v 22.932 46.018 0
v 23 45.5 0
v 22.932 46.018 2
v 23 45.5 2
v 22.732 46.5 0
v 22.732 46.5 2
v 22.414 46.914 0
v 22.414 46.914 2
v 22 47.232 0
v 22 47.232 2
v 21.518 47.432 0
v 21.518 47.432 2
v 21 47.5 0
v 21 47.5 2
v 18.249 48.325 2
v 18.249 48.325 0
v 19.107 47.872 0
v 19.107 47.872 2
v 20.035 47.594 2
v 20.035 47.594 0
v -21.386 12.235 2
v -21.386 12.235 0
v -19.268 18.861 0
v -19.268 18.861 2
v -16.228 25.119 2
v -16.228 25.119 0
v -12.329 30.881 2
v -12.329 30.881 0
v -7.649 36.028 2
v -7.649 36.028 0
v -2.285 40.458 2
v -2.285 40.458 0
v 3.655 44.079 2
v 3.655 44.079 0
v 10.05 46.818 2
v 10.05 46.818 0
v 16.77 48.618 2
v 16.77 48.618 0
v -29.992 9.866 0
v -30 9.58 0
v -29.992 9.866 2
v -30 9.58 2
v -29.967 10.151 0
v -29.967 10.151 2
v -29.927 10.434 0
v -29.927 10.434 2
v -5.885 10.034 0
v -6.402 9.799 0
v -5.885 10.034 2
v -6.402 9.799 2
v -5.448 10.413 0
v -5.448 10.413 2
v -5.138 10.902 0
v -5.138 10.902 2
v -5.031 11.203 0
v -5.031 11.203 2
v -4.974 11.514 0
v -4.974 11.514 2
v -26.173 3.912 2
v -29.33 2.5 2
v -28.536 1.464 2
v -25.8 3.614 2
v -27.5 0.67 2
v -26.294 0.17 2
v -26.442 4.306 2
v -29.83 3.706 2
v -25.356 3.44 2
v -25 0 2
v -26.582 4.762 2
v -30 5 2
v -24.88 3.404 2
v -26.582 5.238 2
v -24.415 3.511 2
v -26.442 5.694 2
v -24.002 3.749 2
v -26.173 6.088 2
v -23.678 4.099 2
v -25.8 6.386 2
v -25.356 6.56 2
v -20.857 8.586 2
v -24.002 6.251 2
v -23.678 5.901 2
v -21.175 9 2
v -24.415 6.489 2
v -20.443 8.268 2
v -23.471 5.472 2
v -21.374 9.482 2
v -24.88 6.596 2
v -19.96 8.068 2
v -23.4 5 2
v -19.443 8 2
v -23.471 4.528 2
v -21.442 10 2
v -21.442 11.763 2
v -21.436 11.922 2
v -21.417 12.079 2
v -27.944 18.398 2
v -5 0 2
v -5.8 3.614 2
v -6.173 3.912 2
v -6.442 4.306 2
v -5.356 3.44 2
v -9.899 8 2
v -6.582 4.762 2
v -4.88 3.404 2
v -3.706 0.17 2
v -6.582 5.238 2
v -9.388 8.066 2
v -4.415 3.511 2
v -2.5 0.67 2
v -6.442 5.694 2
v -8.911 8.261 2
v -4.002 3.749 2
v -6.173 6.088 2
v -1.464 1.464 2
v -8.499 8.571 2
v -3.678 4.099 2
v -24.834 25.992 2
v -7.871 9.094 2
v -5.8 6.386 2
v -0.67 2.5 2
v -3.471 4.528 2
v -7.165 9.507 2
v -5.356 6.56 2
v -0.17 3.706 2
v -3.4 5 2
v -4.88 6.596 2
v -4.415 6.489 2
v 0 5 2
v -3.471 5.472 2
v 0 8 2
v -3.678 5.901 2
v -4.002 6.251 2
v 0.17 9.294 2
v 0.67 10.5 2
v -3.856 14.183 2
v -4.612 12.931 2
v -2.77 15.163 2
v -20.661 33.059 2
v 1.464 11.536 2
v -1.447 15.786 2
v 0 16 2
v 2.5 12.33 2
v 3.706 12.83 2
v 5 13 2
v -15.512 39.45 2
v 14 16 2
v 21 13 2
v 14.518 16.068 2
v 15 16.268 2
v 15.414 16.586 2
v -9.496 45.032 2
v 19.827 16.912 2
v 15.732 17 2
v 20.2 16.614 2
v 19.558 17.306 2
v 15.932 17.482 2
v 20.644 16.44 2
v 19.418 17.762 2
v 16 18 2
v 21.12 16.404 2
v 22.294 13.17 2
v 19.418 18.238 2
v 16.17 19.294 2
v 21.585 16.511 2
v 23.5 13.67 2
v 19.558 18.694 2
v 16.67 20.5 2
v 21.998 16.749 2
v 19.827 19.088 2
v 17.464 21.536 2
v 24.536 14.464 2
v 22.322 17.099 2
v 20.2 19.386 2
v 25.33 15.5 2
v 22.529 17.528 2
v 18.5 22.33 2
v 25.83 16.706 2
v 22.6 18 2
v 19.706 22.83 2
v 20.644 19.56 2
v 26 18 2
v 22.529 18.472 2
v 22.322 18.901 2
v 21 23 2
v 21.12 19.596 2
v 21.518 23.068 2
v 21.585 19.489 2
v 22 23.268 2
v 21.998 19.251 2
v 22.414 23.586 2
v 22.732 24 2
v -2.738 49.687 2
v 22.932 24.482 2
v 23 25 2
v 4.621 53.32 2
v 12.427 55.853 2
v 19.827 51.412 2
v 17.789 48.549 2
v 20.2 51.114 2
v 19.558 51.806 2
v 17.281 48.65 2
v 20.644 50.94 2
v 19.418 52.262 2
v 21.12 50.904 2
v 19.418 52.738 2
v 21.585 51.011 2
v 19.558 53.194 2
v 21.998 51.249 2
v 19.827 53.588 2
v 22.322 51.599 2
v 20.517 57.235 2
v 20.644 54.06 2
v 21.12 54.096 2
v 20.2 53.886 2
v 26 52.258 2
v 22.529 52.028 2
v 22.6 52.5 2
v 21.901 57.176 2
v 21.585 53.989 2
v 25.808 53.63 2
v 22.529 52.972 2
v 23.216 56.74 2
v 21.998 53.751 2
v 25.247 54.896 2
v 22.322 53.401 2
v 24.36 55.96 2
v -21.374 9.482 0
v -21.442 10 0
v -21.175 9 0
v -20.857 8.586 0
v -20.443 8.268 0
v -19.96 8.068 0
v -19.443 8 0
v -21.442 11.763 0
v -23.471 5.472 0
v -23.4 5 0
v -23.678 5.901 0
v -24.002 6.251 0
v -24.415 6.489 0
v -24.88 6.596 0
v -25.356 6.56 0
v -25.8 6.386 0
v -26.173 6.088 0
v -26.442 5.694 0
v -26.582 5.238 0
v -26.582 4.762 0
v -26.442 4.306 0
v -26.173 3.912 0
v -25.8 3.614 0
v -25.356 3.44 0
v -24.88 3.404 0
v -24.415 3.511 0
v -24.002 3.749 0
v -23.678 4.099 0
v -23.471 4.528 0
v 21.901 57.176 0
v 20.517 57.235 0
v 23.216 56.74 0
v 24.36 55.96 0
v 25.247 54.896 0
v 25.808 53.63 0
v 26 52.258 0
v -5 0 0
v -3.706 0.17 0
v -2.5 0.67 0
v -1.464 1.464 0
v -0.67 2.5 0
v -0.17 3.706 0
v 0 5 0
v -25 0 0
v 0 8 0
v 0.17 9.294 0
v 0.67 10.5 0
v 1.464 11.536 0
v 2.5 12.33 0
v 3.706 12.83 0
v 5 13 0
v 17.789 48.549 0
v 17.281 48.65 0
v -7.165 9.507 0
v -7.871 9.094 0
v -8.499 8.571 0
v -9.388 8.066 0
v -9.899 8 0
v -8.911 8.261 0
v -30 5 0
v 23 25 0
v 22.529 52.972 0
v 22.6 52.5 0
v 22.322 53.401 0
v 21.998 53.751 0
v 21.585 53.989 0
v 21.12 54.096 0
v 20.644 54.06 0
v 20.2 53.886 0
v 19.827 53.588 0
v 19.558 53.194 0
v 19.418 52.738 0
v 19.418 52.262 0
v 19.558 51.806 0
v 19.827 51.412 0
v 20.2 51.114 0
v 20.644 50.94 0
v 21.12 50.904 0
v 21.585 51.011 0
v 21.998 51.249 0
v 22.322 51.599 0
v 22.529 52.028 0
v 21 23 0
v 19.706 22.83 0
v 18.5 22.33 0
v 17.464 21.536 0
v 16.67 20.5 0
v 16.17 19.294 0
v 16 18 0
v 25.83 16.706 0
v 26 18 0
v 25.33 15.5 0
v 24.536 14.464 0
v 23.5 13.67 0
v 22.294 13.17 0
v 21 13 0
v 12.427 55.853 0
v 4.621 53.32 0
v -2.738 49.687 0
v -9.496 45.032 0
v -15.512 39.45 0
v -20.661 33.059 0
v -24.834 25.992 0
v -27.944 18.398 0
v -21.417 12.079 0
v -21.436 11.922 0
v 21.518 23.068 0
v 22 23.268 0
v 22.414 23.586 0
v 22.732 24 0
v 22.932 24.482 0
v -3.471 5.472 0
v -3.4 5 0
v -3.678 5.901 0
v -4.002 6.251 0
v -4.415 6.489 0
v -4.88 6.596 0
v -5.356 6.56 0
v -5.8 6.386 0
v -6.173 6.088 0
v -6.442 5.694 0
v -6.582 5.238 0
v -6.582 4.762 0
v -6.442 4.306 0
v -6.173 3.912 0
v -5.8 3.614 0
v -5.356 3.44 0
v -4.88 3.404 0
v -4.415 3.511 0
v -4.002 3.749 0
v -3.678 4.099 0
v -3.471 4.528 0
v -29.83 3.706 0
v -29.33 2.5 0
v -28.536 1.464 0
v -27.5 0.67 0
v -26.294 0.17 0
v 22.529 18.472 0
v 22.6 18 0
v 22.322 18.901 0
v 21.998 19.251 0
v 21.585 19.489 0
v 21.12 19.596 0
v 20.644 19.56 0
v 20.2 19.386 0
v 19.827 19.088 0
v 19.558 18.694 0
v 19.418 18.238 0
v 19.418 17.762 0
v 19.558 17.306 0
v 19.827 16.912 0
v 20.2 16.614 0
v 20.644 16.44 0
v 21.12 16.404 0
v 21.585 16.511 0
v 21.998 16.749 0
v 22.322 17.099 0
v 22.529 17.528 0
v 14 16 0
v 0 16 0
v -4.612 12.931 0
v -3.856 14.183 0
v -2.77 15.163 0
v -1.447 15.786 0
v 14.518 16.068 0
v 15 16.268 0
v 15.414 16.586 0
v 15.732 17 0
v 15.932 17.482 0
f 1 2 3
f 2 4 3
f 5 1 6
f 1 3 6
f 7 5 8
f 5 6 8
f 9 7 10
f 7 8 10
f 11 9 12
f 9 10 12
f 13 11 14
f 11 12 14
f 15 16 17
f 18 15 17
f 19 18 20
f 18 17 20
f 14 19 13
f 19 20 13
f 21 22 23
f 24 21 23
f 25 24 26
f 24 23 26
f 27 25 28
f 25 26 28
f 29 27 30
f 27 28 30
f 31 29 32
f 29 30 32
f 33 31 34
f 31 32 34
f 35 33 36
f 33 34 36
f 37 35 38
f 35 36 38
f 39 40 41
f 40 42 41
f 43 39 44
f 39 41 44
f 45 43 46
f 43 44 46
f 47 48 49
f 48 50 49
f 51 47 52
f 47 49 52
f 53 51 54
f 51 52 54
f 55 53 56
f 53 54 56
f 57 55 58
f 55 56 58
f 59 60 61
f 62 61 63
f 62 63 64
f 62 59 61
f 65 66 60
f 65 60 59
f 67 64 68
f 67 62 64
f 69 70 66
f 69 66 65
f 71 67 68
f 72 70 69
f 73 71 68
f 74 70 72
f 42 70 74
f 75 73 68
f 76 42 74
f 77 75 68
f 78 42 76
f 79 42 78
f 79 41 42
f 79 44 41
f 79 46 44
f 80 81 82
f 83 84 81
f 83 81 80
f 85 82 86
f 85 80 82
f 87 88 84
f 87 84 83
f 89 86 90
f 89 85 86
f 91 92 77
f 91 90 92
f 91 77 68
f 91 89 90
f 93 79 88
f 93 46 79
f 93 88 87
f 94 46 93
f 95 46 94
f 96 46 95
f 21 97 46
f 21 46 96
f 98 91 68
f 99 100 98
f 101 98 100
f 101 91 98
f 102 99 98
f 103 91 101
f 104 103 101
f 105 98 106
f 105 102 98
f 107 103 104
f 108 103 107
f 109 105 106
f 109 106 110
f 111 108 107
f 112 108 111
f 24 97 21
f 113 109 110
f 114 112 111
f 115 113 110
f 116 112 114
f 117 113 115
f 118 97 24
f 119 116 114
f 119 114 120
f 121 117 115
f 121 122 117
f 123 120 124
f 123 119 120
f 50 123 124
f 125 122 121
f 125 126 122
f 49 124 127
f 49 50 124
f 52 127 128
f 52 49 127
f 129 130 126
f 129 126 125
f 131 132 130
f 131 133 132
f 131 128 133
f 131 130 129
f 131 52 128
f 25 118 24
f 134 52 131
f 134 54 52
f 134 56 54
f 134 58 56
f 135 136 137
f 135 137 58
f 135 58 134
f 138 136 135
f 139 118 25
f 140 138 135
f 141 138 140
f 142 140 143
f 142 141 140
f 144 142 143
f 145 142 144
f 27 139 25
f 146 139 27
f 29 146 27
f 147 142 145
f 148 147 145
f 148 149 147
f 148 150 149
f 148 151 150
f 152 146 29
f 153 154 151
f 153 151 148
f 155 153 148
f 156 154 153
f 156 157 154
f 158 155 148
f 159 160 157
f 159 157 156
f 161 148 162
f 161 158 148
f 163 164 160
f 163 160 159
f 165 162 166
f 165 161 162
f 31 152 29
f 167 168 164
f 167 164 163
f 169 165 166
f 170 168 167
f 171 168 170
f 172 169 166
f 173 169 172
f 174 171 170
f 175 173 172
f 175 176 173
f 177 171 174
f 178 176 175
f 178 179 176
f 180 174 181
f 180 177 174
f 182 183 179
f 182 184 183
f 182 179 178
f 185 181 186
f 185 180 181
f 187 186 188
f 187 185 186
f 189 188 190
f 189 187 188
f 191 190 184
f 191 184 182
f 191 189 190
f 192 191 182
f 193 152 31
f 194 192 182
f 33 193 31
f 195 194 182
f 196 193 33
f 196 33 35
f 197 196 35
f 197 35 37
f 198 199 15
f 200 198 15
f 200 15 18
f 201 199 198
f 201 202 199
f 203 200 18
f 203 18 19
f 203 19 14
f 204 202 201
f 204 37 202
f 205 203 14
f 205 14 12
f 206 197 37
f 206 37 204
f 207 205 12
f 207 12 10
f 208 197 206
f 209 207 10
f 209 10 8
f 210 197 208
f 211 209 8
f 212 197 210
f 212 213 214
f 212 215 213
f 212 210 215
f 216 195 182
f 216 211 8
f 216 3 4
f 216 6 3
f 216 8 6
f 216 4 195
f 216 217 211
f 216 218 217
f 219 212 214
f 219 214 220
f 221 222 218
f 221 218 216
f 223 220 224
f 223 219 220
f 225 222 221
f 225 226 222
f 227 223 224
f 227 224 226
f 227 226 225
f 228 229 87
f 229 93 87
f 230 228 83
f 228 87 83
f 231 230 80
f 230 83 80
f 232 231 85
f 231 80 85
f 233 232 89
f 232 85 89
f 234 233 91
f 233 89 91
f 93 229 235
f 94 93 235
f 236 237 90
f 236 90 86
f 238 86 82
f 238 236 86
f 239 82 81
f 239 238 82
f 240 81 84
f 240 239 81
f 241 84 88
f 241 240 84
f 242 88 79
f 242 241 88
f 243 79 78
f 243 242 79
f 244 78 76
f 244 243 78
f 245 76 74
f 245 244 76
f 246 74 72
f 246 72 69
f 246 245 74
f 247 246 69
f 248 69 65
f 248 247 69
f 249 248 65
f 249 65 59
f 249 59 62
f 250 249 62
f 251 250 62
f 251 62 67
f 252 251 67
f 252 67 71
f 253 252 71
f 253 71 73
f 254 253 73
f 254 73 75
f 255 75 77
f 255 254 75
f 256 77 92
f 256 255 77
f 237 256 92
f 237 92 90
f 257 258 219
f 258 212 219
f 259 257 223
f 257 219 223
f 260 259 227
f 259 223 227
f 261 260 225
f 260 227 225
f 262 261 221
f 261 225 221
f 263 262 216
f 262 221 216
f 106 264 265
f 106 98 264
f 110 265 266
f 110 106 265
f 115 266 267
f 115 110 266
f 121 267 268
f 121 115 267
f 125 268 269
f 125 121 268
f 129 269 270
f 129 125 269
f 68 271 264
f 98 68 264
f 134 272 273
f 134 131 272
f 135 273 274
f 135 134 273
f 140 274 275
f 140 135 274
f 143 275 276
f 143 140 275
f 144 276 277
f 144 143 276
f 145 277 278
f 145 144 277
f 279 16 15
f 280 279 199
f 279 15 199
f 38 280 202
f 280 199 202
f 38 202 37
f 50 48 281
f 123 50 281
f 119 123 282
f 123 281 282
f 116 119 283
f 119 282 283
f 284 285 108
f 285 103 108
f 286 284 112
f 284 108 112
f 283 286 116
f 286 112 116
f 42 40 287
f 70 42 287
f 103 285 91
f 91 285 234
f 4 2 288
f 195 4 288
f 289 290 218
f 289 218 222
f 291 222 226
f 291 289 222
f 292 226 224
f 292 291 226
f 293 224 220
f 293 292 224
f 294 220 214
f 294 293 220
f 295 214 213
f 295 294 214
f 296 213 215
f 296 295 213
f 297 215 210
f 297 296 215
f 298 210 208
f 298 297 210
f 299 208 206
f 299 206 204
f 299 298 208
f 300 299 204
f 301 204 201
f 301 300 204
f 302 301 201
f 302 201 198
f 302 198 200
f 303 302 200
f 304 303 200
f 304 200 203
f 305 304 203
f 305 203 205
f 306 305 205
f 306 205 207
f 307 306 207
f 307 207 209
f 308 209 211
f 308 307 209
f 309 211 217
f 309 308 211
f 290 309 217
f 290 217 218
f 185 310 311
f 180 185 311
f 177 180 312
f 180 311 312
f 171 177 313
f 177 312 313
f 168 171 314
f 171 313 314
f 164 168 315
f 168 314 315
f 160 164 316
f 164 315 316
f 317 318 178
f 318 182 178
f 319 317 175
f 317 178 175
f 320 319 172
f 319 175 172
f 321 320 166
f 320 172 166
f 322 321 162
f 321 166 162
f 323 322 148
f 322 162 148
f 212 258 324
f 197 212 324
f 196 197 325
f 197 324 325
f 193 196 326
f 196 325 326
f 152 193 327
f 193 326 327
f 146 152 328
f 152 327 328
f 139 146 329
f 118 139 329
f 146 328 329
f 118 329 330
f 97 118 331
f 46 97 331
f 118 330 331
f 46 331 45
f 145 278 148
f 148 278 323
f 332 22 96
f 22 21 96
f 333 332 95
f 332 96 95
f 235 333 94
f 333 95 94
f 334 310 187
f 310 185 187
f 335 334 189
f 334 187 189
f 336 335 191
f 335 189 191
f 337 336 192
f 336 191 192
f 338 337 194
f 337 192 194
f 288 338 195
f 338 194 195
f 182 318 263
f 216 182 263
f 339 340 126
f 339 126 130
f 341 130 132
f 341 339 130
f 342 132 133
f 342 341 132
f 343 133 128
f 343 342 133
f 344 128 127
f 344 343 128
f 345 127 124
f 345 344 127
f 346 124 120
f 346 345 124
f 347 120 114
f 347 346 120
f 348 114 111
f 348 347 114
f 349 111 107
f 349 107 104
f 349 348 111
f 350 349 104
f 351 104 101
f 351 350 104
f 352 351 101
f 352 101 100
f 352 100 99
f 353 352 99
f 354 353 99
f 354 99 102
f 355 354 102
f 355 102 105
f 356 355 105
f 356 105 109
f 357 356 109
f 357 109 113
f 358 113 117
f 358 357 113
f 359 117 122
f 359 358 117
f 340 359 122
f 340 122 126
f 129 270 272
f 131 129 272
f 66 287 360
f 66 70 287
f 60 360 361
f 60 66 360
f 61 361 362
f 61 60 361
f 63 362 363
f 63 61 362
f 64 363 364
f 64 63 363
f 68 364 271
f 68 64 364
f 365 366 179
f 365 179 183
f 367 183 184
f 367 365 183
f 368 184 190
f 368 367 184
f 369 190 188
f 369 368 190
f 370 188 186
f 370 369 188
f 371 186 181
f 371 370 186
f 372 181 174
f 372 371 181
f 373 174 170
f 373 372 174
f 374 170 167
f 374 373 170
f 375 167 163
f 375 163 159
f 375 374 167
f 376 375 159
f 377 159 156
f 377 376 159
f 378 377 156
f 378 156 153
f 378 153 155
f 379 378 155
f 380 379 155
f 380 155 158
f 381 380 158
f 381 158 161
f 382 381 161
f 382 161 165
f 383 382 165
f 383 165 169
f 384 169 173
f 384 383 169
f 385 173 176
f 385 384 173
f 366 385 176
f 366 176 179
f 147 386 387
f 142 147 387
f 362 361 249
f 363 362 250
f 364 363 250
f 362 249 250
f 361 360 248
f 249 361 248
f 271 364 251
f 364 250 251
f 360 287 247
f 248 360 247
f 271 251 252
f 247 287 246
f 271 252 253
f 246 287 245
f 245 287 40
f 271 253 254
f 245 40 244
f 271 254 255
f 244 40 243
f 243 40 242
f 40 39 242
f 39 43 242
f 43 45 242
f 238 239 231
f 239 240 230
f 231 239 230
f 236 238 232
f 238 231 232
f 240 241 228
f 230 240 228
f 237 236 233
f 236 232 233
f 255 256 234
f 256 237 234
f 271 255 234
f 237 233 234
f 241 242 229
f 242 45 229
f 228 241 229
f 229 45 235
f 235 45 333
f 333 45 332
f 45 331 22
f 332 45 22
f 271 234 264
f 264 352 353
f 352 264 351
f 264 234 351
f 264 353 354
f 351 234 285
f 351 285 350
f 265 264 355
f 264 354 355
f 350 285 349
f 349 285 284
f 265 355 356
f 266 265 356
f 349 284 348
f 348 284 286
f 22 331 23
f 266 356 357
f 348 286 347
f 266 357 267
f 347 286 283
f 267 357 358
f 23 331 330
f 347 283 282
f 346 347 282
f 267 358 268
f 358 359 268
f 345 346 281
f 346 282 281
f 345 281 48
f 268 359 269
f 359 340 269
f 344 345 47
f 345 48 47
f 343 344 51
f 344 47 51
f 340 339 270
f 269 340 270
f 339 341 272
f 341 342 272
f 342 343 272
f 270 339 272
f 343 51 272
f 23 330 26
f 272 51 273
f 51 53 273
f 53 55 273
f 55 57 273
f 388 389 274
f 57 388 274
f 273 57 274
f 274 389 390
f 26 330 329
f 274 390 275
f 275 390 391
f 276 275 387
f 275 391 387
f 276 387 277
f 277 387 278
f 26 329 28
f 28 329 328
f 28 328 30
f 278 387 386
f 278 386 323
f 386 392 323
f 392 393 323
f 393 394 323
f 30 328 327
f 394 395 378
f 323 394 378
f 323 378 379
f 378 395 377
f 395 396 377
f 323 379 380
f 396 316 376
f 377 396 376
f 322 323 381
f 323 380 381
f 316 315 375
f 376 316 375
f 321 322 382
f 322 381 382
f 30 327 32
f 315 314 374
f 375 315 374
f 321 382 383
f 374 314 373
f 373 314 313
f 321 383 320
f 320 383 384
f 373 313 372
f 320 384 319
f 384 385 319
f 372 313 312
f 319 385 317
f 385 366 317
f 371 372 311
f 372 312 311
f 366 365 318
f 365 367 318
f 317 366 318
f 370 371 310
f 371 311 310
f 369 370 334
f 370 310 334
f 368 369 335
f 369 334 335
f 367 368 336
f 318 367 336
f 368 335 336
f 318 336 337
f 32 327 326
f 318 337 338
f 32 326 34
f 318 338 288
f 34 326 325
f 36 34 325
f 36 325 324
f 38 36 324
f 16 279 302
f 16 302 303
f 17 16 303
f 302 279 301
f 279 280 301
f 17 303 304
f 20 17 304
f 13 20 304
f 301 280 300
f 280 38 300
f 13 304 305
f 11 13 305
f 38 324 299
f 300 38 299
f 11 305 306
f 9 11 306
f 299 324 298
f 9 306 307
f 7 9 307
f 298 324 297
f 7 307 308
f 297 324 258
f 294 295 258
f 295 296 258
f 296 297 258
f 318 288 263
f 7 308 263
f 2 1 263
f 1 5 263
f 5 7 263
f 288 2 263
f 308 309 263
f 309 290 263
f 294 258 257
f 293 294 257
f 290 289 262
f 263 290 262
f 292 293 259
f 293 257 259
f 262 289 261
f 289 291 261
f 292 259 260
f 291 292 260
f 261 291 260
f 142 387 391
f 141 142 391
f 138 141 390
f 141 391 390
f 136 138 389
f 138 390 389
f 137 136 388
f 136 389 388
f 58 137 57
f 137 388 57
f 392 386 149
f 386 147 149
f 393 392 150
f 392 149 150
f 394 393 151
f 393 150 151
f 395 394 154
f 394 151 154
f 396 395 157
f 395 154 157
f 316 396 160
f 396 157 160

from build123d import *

# Parameters (mm, degrees)
SKETCH_1_R      = 1.6
EXTRUDE_1_DEPTH = 2
FILLET_1_R      = 5
FILLET_2_R      = 2


with BuildPart() as part:
    # ｽｹｯﾁ1 → ﾎﾞｽ - 押し出し1 (new body)
    with BuildSketch(Plane.XY):
        with BuildLine():
            Line((-30, 10), (-30, 0))
            Line((-30, 0), (0, 0))
            Line((0, 0), (0, 13))
            Line((0, 13), (26, 13))
            Line((26, 13), (26, 57.5))
            ThreePointArc((26, 57.5), (-10.715970639, 44.025670649), (-30, 10))
        make_face()
        with Locations((-25, 5)):
            Circle(SKETCH_1_R, mode=Mode.SUBTRACT)
        with Locations((-5, 5)):
            Circle(SKETCH_1_R, mode=Mode.SUBTRACT)
        with Locations((21, 18)):
            Circle(SKETCH_1_R, mode=Mode.SUBTRACT)
        with Locations((21, 52.5)):
            Circle(SKETCH_1_R, mode=Mode.SUBTRACT)
        with BuildLine():
            Line((-5, 11), (-5, 10))
            ThreePointArc((-5, 10), (-7.236067977, 9.472135955), (-9, 8))
            Line((-9, 8), (-21.442485956, 8))
            Line((-21.442485956, 8), (-21.442485956, 12))
            ThreePointArc((-21.442485956, 12), (-7.409474557, 36.255609967), (17.657876922, 48.781100521))
            ThreePointArc((17.657876922, 48.781100521), (19.210376771, 47.83124763), (21, 47.5))
            Line((21, 47.5), (23, 47.5))
            Line((23, 47.5), (23, 23))
            Line((23, 23), (21, 23))
            ThreePointArc((21, 23), (17.464466094, 21.535533906), (16, 18))
            Line((16, 18), (16, 16))
            Line((16, 16), (0, 16))
            ThreePointArc((0, 16), (-3.535533906, 14.535533906), (-5, 11))
        make_face(mode=Mode.SUBTRACT)
    extrude(amount=EXTRUDE_1_DEPTH)

    # ﾌｨﾚｯﾄ1
    fillet_1_edges = [part.edges().sort_by_distance(p)[0] for p in [
        (26, 57.5, 1),
        (26, 13, 1),
        (0, 13, 1),
        (0, 0, 1),
        (-30, 0, 1),
        (-30, 10, 1),
    ]]
    fillet(fillet_1_edges, radius=FILLET_1_R)

    # ﾌｨﾚｯﾄ2
    fillet_2_edges = [part.edges().sort_by_distance(p)[0] for p in [
        (17.657876922, 48.781100521, 1),
        (23, 47.5, 1),
        (16, 16, 1),
        (23, 23, 1),
        (-5, 10, 1),
        (-9, 8, 1),
        (-21.442485956, 8, 1),
        (-21.442485956, 12, 1),
    ]]
    fillet(fillet_2_edges, radius=FILLET_2_R - 0.0001)  # a hair under: the kernel refuses the full size


solid = part.part
